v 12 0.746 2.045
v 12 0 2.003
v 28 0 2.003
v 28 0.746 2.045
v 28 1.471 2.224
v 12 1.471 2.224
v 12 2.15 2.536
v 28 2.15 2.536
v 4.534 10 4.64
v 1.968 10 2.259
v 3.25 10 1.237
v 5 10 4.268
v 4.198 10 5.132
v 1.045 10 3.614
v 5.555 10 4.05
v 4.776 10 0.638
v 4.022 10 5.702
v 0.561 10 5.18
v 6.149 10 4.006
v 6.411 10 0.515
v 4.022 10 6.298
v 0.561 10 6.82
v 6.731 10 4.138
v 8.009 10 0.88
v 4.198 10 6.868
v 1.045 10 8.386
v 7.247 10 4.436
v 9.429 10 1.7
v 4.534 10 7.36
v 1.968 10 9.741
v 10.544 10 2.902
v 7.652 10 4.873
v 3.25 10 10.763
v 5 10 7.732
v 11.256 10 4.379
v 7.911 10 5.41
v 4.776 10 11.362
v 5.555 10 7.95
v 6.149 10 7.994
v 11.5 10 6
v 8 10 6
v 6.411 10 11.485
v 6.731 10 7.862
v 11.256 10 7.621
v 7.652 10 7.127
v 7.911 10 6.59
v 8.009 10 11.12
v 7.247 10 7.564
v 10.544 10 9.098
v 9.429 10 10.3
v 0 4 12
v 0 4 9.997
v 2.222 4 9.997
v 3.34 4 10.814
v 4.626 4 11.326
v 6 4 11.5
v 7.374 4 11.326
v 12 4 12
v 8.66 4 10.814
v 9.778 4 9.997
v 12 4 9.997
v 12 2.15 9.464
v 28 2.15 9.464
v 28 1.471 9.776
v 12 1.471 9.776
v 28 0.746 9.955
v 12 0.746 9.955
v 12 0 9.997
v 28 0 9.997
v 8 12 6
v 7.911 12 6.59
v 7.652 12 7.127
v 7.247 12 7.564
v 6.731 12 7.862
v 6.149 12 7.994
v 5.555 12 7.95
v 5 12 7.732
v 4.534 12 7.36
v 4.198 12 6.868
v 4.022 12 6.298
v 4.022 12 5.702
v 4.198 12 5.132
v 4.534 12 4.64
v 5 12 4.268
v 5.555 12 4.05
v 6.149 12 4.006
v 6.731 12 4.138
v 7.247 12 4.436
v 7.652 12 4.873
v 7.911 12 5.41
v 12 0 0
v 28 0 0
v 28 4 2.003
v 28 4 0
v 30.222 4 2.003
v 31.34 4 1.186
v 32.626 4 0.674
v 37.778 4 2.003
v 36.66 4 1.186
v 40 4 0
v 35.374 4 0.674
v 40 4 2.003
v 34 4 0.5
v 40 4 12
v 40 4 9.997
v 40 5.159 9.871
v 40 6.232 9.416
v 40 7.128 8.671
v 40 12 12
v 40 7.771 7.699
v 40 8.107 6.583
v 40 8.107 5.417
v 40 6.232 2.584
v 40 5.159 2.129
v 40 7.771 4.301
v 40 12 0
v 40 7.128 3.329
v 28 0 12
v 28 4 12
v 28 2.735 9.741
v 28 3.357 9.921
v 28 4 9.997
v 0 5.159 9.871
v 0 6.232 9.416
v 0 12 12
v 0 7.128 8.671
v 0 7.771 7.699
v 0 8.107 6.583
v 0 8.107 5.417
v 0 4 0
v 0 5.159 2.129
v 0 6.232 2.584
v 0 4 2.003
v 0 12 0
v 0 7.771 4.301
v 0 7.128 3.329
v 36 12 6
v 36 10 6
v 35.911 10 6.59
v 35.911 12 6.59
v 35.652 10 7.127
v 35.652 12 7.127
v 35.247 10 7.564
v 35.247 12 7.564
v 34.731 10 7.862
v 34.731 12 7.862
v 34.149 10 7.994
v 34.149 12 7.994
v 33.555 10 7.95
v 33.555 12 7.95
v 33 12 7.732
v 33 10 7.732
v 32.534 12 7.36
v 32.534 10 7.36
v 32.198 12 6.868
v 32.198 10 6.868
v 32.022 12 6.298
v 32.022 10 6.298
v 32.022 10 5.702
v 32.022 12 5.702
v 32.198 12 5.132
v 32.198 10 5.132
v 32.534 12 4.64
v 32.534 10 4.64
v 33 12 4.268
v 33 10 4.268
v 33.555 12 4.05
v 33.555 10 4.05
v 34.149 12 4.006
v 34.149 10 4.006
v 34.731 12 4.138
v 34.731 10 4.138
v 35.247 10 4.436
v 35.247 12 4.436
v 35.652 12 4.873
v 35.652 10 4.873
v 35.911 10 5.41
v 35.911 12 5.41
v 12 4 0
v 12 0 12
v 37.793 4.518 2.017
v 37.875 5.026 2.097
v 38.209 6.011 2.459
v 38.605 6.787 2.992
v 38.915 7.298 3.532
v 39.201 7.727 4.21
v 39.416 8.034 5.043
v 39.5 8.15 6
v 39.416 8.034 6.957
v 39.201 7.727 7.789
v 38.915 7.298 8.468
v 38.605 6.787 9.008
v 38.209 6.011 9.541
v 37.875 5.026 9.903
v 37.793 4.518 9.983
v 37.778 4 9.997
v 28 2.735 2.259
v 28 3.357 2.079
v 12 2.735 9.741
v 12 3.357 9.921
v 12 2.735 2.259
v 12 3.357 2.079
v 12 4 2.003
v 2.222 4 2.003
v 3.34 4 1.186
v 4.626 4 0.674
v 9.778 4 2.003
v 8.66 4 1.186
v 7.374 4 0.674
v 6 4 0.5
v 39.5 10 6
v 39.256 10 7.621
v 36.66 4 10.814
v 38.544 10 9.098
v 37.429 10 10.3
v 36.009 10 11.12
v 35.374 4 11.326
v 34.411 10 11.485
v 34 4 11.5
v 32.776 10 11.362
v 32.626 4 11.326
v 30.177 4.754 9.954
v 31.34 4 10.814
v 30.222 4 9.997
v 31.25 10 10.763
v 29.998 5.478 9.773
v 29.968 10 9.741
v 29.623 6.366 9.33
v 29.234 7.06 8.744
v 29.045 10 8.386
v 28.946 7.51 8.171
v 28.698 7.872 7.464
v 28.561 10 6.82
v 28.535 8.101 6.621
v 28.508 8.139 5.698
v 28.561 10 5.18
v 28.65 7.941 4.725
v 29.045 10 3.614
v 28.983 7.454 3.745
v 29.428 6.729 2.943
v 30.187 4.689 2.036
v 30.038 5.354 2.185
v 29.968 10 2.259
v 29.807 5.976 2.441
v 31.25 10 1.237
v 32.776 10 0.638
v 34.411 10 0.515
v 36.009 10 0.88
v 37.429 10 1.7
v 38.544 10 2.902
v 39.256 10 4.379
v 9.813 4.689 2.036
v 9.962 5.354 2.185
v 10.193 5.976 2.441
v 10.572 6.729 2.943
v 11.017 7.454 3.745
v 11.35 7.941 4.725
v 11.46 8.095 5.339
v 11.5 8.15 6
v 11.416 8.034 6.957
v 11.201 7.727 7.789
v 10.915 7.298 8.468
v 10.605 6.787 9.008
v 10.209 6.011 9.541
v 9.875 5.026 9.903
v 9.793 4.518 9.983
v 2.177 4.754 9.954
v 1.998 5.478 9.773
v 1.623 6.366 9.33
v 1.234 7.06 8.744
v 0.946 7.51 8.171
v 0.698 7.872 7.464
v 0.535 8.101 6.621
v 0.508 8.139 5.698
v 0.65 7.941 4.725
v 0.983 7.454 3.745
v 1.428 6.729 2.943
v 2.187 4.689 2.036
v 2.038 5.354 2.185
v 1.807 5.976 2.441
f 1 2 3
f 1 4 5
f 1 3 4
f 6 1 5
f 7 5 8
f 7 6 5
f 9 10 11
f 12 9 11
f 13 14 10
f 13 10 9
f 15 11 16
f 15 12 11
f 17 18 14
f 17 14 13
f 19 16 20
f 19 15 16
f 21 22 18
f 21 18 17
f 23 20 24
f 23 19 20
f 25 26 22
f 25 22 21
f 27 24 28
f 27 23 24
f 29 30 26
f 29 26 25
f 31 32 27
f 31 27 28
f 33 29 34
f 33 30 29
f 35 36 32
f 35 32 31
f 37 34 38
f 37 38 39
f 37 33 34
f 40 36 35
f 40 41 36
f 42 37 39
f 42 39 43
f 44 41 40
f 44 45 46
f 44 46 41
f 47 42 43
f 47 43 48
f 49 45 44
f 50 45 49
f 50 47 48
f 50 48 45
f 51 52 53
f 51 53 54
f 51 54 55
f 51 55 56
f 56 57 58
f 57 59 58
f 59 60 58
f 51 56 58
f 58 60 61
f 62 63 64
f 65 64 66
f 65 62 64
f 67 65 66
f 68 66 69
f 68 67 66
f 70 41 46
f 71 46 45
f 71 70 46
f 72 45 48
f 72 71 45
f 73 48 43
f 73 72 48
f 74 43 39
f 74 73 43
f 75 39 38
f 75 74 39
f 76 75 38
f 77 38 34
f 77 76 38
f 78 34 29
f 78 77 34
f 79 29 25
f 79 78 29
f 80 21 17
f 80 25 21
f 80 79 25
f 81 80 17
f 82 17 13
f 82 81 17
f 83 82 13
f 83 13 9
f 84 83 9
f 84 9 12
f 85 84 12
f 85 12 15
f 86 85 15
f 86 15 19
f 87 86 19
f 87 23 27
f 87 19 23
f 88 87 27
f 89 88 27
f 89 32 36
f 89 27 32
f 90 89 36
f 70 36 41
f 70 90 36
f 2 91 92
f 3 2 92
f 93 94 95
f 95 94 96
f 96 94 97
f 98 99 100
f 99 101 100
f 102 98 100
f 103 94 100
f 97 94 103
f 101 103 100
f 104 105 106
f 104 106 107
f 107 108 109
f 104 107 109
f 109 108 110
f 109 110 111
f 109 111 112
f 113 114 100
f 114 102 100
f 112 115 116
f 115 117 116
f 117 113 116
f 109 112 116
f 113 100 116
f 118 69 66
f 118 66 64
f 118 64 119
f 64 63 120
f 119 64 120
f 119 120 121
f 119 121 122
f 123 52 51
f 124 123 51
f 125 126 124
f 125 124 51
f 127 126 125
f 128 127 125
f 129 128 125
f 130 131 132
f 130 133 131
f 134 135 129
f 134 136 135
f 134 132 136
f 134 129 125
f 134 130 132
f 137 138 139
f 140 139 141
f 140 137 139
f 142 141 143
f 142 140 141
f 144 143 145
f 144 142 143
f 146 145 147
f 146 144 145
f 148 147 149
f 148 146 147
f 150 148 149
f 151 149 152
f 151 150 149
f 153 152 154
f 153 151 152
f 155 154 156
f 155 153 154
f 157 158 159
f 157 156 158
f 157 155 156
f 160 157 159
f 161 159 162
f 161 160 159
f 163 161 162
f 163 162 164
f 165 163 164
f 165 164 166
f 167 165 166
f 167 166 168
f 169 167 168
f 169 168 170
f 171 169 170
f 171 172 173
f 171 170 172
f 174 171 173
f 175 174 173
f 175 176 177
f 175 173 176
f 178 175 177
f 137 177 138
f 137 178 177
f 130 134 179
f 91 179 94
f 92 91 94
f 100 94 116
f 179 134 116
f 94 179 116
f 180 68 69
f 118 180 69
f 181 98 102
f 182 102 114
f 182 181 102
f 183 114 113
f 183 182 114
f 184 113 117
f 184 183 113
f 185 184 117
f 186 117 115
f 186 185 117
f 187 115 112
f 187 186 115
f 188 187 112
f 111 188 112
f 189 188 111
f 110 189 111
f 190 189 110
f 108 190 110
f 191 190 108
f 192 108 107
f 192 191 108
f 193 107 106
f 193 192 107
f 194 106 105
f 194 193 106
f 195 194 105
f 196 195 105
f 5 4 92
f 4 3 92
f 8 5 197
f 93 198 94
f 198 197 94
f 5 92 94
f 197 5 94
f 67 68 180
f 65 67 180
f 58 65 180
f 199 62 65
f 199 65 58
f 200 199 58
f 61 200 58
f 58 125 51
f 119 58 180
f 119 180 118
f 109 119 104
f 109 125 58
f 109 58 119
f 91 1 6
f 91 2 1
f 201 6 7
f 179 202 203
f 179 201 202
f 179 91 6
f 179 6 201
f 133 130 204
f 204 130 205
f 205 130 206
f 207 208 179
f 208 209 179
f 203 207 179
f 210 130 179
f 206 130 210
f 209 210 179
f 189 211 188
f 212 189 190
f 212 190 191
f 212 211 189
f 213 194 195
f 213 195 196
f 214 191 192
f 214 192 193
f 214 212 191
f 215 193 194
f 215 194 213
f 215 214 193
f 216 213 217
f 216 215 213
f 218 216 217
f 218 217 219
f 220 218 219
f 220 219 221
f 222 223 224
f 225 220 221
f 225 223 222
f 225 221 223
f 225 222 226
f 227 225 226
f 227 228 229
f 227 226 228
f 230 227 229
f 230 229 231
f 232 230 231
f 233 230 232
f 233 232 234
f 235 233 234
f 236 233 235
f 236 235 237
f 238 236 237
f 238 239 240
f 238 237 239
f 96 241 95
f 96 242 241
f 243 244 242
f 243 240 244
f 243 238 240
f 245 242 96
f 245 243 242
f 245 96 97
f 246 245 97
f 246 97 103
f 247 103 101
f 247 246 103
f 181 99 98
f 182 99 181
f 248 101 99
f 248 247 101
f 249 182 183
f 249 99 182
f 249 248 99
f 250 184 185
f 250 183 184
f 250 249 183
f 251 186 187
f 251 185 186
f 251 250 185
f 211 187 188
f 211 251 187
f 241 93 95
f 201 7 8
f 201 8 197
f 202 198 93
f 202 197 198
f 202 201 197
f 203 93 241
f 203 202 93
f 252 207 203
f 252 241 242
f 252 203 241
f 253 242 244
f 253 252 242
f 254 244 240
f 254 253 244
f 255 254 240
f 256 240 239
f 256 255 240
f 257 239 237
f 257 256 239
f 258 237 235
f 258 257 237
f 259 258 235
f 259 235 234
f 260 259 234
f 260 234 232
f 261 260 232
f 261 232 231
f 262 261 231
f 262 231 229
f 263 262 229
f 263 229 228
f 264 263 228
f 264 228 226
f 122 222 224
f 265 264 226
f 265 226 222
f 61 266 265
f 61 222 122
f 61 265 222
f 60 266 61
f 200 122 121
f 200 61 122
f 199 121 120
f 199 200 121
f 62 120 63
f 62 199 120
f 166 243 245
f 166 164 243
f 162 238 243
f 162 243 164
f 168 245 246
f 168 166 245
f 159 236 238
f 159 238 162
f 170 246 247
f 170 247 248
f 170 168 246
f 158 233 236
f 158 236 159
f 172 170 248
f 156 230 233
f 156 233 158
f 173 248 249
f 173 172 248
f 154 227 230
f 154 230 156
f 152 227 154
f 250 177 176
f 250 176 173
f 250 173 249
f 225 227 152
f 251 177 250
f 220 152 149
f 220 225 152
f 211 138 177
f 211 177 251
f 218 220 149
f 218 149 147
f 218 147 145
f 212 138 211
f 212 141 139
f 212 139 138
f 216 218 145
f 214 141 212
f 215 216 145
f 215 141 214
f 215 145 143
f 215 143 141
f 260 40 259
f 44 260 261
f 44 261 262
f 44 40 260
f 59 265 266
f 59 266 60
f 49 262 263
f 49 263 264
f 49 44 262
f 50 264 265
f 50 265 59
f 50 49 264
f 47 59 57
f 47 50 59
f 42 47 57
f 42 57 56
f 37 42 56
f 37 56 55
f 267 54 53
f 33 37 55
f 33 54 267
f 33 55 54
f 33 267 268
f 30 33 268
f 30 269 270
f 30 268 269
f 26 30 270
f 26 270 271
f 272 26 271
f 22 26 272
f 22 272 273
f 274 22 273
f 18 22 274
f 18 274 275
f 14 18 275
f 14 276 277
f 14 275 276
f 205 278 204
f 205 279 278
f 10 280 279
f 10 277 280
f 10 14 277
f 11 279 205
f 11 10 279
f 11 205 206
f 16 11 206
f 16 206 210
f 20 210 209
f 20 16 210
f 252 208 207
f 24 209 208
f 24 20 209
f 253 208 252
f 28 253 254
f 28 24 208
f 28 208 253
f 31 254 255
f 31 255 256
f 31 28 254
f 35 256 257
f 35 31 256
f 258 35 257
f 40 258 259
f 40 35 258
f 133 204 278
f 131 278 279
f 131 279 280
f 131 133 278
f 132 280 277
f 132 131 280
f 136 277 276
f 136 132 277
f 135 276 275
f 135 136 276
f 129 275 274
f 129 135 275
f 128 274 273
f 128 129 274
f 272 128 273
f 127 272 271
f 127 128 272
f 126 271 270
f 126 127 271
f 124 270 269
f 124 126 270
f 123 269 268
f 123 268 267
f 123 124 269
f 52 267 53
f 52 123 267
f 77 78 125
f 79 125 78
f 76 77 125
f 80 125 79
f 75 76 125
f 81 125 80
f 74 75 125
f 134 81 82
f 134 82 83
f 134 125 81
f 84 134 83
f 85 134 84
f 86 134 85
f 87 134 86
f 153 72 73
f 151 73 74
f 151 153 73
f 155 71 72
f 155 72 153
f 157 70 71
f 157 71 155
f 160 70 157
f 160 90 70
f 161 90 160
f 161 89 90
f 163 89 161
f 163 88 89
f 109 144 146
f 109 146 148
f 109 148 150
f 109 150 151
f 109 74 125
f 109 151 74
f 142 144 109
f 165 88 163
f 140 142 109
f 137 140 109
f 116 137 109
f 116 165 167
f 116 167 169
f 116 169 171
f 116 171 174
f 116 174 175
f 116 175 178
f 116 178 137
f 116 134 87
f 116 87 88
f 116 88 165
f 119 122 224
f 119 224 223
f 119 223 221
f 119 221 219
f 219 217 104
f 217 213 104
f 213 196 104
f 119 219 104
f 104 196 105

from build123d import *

# Parameters (mm, degrees)
CYLINDER042_R     = 5.5
CYLINDER042_DEPTH = 10
BOX012_W          = 12
BOX012_H          = 4
BOX012_DEPTH      = 12
CYLINDER041_R     = 2
CYLINDER041_DEPTH = 12
CYLINDER040_R     = 5.5
CYLINDER040_DEPTH = 10
BOX011_W          = 12
BOX011_H          = 4
BOX011_DEPTH      = 12
CYLINDER039_R     = 2
CYLINDER039_DEPTH = 12
CYLINDER043_R     = 4
CYLINDER043_DEPTH = 40
CYLINDER038_R     = 4
CYLINDER038_DEPTH = 40
BOX009_W          = 40
BOX009_H          = 12
BOX009_DEPTH      = 12


with BuildPart() as cylinder042:
    # Cylinder042 → Cylinder042 (new body)
    with BuildSketch(Plane(origin=(20, 10, 6), x_dir=(1, 0, 0), z_dir=(0, -1, 0))):
        Circle(CYLINDER042_R)
    extrude(amount=CYLINDER042_DEPTH)


with BuildPart() as cube012:
    # Box012 → Box012 (new body)
    with BuildSketch(Plane(origin=(14, 0, 0), x_dir=(1, 0, 0), z_dir=(0, 0, 1))):
        with Locations((6, 2)):
            Rectangle(BOX012_W, BOX012_H)
    extrude(amount=BOX012_DEPTH)


with BuildPart() as fusion014:
    # Cylinder041 → Cylinder041 (new body)
    with BuildSketch(Plane(origin=(20, 12, 6), x_dir=(1, 0, 0), z_dir=(0, -1, 0))):
        Circle(CYLINDER041_R)
    extrude(amount=CYLINDER041_DEPTH)

    # Fusion014: union Cylinder042, Cube012
    add(cylinder042.part)
    add(cube012.part)


with BuildPart() as fusion014_1:
    # Fusion014 placement: moved
    add(fusion014.part.moved(Location((14, 0, 0))))


with BuildPart() as cylinder040:
    # Cylinder040 → Cylinder040 (new body)
    with BuildSketch(Plane(origin=(20, 10, 6), x_dir=(1, 0, 0), z_dir=(0, -1, 0))):
        Circle(CYLINDER040_R)
    extrude(amount=CYLINDER040_DEPTH)


with BuildPart() as cube011:
    # Box011 → Box011 (new body)
    with BuildSketch(Plane(origin=(14, 0, 0), x_dir=(1, 0, 0), z_dir=(0, 0, 1))):
        with Locations((6, 2)):
            Rectangle(BOX011_W, BOX011_H)
    extrude(amount=BOX011_DEPTH)


with BuildPart() as fusion015:
    # Cylinder039 → Cylinder039 (new body)
    with BuildSketch(Plane(origin=(20, 12, 6), x_dir=(1, 0, 0), z_dir=(0, -1, 0))):
        Circle(CYLINDER039_R)
    extrude(amount=CYLINDER039_DEPTH)

    # Fusion013: union Cylinder040, Cube011
    add(cylinder040.part)
    add(cube011.part)


with BuildPart() as fusion015_1:
    # Fusion013 placement: moved
    add(fusion015.part.moved(Location((-14, 0, 0))))

    # Fusion015: union Fusion014
    add(fusion014_1.part)


with BuildPart() as cylinder043:
    # Cylinder043 → Cylinder043 (new body)
    with BuildSketch(Plane(origin=(0, 0.15, 6), x_dir=(0, 0, -1), z_dir=(1, 0, 0))):
        Circle(CYLINDER043_R)
    extrude(amount=CYLINDER043_DEPTH)


with BuildPart() as fusion016:
    # Cylinder038 → Cylinder038 (new body)
    with BuildSketch(Plane(origin=(0, 4.15, 6), x_dir=(0, 0, -1), z_dir=(1, 0, 0))):
        Circle(CYLINDER038_R)
    extrude(amount=CYLINDER038_DEPTH)

    # Fusion016: union Cylinder043
    add(cylinder043.part)


with BuildPart() as cut015:
    # Box009 → Box009 (new body)
    with BuildSketch(Plane.XY):
        with Locations((20, 6)):
            Rectangle(BOX009_W, BOX009_H)
    extrude(amount=BOX009_DEPTH)

    # Cut014: cut Fusion016
    add(fusion016.part, mode=Mode.SUBTRACT)

    # Cut015: cut Fusion015
    add(fusion015_1.part, mode=Mode.SUBTRACT)


solid = cut015.part
